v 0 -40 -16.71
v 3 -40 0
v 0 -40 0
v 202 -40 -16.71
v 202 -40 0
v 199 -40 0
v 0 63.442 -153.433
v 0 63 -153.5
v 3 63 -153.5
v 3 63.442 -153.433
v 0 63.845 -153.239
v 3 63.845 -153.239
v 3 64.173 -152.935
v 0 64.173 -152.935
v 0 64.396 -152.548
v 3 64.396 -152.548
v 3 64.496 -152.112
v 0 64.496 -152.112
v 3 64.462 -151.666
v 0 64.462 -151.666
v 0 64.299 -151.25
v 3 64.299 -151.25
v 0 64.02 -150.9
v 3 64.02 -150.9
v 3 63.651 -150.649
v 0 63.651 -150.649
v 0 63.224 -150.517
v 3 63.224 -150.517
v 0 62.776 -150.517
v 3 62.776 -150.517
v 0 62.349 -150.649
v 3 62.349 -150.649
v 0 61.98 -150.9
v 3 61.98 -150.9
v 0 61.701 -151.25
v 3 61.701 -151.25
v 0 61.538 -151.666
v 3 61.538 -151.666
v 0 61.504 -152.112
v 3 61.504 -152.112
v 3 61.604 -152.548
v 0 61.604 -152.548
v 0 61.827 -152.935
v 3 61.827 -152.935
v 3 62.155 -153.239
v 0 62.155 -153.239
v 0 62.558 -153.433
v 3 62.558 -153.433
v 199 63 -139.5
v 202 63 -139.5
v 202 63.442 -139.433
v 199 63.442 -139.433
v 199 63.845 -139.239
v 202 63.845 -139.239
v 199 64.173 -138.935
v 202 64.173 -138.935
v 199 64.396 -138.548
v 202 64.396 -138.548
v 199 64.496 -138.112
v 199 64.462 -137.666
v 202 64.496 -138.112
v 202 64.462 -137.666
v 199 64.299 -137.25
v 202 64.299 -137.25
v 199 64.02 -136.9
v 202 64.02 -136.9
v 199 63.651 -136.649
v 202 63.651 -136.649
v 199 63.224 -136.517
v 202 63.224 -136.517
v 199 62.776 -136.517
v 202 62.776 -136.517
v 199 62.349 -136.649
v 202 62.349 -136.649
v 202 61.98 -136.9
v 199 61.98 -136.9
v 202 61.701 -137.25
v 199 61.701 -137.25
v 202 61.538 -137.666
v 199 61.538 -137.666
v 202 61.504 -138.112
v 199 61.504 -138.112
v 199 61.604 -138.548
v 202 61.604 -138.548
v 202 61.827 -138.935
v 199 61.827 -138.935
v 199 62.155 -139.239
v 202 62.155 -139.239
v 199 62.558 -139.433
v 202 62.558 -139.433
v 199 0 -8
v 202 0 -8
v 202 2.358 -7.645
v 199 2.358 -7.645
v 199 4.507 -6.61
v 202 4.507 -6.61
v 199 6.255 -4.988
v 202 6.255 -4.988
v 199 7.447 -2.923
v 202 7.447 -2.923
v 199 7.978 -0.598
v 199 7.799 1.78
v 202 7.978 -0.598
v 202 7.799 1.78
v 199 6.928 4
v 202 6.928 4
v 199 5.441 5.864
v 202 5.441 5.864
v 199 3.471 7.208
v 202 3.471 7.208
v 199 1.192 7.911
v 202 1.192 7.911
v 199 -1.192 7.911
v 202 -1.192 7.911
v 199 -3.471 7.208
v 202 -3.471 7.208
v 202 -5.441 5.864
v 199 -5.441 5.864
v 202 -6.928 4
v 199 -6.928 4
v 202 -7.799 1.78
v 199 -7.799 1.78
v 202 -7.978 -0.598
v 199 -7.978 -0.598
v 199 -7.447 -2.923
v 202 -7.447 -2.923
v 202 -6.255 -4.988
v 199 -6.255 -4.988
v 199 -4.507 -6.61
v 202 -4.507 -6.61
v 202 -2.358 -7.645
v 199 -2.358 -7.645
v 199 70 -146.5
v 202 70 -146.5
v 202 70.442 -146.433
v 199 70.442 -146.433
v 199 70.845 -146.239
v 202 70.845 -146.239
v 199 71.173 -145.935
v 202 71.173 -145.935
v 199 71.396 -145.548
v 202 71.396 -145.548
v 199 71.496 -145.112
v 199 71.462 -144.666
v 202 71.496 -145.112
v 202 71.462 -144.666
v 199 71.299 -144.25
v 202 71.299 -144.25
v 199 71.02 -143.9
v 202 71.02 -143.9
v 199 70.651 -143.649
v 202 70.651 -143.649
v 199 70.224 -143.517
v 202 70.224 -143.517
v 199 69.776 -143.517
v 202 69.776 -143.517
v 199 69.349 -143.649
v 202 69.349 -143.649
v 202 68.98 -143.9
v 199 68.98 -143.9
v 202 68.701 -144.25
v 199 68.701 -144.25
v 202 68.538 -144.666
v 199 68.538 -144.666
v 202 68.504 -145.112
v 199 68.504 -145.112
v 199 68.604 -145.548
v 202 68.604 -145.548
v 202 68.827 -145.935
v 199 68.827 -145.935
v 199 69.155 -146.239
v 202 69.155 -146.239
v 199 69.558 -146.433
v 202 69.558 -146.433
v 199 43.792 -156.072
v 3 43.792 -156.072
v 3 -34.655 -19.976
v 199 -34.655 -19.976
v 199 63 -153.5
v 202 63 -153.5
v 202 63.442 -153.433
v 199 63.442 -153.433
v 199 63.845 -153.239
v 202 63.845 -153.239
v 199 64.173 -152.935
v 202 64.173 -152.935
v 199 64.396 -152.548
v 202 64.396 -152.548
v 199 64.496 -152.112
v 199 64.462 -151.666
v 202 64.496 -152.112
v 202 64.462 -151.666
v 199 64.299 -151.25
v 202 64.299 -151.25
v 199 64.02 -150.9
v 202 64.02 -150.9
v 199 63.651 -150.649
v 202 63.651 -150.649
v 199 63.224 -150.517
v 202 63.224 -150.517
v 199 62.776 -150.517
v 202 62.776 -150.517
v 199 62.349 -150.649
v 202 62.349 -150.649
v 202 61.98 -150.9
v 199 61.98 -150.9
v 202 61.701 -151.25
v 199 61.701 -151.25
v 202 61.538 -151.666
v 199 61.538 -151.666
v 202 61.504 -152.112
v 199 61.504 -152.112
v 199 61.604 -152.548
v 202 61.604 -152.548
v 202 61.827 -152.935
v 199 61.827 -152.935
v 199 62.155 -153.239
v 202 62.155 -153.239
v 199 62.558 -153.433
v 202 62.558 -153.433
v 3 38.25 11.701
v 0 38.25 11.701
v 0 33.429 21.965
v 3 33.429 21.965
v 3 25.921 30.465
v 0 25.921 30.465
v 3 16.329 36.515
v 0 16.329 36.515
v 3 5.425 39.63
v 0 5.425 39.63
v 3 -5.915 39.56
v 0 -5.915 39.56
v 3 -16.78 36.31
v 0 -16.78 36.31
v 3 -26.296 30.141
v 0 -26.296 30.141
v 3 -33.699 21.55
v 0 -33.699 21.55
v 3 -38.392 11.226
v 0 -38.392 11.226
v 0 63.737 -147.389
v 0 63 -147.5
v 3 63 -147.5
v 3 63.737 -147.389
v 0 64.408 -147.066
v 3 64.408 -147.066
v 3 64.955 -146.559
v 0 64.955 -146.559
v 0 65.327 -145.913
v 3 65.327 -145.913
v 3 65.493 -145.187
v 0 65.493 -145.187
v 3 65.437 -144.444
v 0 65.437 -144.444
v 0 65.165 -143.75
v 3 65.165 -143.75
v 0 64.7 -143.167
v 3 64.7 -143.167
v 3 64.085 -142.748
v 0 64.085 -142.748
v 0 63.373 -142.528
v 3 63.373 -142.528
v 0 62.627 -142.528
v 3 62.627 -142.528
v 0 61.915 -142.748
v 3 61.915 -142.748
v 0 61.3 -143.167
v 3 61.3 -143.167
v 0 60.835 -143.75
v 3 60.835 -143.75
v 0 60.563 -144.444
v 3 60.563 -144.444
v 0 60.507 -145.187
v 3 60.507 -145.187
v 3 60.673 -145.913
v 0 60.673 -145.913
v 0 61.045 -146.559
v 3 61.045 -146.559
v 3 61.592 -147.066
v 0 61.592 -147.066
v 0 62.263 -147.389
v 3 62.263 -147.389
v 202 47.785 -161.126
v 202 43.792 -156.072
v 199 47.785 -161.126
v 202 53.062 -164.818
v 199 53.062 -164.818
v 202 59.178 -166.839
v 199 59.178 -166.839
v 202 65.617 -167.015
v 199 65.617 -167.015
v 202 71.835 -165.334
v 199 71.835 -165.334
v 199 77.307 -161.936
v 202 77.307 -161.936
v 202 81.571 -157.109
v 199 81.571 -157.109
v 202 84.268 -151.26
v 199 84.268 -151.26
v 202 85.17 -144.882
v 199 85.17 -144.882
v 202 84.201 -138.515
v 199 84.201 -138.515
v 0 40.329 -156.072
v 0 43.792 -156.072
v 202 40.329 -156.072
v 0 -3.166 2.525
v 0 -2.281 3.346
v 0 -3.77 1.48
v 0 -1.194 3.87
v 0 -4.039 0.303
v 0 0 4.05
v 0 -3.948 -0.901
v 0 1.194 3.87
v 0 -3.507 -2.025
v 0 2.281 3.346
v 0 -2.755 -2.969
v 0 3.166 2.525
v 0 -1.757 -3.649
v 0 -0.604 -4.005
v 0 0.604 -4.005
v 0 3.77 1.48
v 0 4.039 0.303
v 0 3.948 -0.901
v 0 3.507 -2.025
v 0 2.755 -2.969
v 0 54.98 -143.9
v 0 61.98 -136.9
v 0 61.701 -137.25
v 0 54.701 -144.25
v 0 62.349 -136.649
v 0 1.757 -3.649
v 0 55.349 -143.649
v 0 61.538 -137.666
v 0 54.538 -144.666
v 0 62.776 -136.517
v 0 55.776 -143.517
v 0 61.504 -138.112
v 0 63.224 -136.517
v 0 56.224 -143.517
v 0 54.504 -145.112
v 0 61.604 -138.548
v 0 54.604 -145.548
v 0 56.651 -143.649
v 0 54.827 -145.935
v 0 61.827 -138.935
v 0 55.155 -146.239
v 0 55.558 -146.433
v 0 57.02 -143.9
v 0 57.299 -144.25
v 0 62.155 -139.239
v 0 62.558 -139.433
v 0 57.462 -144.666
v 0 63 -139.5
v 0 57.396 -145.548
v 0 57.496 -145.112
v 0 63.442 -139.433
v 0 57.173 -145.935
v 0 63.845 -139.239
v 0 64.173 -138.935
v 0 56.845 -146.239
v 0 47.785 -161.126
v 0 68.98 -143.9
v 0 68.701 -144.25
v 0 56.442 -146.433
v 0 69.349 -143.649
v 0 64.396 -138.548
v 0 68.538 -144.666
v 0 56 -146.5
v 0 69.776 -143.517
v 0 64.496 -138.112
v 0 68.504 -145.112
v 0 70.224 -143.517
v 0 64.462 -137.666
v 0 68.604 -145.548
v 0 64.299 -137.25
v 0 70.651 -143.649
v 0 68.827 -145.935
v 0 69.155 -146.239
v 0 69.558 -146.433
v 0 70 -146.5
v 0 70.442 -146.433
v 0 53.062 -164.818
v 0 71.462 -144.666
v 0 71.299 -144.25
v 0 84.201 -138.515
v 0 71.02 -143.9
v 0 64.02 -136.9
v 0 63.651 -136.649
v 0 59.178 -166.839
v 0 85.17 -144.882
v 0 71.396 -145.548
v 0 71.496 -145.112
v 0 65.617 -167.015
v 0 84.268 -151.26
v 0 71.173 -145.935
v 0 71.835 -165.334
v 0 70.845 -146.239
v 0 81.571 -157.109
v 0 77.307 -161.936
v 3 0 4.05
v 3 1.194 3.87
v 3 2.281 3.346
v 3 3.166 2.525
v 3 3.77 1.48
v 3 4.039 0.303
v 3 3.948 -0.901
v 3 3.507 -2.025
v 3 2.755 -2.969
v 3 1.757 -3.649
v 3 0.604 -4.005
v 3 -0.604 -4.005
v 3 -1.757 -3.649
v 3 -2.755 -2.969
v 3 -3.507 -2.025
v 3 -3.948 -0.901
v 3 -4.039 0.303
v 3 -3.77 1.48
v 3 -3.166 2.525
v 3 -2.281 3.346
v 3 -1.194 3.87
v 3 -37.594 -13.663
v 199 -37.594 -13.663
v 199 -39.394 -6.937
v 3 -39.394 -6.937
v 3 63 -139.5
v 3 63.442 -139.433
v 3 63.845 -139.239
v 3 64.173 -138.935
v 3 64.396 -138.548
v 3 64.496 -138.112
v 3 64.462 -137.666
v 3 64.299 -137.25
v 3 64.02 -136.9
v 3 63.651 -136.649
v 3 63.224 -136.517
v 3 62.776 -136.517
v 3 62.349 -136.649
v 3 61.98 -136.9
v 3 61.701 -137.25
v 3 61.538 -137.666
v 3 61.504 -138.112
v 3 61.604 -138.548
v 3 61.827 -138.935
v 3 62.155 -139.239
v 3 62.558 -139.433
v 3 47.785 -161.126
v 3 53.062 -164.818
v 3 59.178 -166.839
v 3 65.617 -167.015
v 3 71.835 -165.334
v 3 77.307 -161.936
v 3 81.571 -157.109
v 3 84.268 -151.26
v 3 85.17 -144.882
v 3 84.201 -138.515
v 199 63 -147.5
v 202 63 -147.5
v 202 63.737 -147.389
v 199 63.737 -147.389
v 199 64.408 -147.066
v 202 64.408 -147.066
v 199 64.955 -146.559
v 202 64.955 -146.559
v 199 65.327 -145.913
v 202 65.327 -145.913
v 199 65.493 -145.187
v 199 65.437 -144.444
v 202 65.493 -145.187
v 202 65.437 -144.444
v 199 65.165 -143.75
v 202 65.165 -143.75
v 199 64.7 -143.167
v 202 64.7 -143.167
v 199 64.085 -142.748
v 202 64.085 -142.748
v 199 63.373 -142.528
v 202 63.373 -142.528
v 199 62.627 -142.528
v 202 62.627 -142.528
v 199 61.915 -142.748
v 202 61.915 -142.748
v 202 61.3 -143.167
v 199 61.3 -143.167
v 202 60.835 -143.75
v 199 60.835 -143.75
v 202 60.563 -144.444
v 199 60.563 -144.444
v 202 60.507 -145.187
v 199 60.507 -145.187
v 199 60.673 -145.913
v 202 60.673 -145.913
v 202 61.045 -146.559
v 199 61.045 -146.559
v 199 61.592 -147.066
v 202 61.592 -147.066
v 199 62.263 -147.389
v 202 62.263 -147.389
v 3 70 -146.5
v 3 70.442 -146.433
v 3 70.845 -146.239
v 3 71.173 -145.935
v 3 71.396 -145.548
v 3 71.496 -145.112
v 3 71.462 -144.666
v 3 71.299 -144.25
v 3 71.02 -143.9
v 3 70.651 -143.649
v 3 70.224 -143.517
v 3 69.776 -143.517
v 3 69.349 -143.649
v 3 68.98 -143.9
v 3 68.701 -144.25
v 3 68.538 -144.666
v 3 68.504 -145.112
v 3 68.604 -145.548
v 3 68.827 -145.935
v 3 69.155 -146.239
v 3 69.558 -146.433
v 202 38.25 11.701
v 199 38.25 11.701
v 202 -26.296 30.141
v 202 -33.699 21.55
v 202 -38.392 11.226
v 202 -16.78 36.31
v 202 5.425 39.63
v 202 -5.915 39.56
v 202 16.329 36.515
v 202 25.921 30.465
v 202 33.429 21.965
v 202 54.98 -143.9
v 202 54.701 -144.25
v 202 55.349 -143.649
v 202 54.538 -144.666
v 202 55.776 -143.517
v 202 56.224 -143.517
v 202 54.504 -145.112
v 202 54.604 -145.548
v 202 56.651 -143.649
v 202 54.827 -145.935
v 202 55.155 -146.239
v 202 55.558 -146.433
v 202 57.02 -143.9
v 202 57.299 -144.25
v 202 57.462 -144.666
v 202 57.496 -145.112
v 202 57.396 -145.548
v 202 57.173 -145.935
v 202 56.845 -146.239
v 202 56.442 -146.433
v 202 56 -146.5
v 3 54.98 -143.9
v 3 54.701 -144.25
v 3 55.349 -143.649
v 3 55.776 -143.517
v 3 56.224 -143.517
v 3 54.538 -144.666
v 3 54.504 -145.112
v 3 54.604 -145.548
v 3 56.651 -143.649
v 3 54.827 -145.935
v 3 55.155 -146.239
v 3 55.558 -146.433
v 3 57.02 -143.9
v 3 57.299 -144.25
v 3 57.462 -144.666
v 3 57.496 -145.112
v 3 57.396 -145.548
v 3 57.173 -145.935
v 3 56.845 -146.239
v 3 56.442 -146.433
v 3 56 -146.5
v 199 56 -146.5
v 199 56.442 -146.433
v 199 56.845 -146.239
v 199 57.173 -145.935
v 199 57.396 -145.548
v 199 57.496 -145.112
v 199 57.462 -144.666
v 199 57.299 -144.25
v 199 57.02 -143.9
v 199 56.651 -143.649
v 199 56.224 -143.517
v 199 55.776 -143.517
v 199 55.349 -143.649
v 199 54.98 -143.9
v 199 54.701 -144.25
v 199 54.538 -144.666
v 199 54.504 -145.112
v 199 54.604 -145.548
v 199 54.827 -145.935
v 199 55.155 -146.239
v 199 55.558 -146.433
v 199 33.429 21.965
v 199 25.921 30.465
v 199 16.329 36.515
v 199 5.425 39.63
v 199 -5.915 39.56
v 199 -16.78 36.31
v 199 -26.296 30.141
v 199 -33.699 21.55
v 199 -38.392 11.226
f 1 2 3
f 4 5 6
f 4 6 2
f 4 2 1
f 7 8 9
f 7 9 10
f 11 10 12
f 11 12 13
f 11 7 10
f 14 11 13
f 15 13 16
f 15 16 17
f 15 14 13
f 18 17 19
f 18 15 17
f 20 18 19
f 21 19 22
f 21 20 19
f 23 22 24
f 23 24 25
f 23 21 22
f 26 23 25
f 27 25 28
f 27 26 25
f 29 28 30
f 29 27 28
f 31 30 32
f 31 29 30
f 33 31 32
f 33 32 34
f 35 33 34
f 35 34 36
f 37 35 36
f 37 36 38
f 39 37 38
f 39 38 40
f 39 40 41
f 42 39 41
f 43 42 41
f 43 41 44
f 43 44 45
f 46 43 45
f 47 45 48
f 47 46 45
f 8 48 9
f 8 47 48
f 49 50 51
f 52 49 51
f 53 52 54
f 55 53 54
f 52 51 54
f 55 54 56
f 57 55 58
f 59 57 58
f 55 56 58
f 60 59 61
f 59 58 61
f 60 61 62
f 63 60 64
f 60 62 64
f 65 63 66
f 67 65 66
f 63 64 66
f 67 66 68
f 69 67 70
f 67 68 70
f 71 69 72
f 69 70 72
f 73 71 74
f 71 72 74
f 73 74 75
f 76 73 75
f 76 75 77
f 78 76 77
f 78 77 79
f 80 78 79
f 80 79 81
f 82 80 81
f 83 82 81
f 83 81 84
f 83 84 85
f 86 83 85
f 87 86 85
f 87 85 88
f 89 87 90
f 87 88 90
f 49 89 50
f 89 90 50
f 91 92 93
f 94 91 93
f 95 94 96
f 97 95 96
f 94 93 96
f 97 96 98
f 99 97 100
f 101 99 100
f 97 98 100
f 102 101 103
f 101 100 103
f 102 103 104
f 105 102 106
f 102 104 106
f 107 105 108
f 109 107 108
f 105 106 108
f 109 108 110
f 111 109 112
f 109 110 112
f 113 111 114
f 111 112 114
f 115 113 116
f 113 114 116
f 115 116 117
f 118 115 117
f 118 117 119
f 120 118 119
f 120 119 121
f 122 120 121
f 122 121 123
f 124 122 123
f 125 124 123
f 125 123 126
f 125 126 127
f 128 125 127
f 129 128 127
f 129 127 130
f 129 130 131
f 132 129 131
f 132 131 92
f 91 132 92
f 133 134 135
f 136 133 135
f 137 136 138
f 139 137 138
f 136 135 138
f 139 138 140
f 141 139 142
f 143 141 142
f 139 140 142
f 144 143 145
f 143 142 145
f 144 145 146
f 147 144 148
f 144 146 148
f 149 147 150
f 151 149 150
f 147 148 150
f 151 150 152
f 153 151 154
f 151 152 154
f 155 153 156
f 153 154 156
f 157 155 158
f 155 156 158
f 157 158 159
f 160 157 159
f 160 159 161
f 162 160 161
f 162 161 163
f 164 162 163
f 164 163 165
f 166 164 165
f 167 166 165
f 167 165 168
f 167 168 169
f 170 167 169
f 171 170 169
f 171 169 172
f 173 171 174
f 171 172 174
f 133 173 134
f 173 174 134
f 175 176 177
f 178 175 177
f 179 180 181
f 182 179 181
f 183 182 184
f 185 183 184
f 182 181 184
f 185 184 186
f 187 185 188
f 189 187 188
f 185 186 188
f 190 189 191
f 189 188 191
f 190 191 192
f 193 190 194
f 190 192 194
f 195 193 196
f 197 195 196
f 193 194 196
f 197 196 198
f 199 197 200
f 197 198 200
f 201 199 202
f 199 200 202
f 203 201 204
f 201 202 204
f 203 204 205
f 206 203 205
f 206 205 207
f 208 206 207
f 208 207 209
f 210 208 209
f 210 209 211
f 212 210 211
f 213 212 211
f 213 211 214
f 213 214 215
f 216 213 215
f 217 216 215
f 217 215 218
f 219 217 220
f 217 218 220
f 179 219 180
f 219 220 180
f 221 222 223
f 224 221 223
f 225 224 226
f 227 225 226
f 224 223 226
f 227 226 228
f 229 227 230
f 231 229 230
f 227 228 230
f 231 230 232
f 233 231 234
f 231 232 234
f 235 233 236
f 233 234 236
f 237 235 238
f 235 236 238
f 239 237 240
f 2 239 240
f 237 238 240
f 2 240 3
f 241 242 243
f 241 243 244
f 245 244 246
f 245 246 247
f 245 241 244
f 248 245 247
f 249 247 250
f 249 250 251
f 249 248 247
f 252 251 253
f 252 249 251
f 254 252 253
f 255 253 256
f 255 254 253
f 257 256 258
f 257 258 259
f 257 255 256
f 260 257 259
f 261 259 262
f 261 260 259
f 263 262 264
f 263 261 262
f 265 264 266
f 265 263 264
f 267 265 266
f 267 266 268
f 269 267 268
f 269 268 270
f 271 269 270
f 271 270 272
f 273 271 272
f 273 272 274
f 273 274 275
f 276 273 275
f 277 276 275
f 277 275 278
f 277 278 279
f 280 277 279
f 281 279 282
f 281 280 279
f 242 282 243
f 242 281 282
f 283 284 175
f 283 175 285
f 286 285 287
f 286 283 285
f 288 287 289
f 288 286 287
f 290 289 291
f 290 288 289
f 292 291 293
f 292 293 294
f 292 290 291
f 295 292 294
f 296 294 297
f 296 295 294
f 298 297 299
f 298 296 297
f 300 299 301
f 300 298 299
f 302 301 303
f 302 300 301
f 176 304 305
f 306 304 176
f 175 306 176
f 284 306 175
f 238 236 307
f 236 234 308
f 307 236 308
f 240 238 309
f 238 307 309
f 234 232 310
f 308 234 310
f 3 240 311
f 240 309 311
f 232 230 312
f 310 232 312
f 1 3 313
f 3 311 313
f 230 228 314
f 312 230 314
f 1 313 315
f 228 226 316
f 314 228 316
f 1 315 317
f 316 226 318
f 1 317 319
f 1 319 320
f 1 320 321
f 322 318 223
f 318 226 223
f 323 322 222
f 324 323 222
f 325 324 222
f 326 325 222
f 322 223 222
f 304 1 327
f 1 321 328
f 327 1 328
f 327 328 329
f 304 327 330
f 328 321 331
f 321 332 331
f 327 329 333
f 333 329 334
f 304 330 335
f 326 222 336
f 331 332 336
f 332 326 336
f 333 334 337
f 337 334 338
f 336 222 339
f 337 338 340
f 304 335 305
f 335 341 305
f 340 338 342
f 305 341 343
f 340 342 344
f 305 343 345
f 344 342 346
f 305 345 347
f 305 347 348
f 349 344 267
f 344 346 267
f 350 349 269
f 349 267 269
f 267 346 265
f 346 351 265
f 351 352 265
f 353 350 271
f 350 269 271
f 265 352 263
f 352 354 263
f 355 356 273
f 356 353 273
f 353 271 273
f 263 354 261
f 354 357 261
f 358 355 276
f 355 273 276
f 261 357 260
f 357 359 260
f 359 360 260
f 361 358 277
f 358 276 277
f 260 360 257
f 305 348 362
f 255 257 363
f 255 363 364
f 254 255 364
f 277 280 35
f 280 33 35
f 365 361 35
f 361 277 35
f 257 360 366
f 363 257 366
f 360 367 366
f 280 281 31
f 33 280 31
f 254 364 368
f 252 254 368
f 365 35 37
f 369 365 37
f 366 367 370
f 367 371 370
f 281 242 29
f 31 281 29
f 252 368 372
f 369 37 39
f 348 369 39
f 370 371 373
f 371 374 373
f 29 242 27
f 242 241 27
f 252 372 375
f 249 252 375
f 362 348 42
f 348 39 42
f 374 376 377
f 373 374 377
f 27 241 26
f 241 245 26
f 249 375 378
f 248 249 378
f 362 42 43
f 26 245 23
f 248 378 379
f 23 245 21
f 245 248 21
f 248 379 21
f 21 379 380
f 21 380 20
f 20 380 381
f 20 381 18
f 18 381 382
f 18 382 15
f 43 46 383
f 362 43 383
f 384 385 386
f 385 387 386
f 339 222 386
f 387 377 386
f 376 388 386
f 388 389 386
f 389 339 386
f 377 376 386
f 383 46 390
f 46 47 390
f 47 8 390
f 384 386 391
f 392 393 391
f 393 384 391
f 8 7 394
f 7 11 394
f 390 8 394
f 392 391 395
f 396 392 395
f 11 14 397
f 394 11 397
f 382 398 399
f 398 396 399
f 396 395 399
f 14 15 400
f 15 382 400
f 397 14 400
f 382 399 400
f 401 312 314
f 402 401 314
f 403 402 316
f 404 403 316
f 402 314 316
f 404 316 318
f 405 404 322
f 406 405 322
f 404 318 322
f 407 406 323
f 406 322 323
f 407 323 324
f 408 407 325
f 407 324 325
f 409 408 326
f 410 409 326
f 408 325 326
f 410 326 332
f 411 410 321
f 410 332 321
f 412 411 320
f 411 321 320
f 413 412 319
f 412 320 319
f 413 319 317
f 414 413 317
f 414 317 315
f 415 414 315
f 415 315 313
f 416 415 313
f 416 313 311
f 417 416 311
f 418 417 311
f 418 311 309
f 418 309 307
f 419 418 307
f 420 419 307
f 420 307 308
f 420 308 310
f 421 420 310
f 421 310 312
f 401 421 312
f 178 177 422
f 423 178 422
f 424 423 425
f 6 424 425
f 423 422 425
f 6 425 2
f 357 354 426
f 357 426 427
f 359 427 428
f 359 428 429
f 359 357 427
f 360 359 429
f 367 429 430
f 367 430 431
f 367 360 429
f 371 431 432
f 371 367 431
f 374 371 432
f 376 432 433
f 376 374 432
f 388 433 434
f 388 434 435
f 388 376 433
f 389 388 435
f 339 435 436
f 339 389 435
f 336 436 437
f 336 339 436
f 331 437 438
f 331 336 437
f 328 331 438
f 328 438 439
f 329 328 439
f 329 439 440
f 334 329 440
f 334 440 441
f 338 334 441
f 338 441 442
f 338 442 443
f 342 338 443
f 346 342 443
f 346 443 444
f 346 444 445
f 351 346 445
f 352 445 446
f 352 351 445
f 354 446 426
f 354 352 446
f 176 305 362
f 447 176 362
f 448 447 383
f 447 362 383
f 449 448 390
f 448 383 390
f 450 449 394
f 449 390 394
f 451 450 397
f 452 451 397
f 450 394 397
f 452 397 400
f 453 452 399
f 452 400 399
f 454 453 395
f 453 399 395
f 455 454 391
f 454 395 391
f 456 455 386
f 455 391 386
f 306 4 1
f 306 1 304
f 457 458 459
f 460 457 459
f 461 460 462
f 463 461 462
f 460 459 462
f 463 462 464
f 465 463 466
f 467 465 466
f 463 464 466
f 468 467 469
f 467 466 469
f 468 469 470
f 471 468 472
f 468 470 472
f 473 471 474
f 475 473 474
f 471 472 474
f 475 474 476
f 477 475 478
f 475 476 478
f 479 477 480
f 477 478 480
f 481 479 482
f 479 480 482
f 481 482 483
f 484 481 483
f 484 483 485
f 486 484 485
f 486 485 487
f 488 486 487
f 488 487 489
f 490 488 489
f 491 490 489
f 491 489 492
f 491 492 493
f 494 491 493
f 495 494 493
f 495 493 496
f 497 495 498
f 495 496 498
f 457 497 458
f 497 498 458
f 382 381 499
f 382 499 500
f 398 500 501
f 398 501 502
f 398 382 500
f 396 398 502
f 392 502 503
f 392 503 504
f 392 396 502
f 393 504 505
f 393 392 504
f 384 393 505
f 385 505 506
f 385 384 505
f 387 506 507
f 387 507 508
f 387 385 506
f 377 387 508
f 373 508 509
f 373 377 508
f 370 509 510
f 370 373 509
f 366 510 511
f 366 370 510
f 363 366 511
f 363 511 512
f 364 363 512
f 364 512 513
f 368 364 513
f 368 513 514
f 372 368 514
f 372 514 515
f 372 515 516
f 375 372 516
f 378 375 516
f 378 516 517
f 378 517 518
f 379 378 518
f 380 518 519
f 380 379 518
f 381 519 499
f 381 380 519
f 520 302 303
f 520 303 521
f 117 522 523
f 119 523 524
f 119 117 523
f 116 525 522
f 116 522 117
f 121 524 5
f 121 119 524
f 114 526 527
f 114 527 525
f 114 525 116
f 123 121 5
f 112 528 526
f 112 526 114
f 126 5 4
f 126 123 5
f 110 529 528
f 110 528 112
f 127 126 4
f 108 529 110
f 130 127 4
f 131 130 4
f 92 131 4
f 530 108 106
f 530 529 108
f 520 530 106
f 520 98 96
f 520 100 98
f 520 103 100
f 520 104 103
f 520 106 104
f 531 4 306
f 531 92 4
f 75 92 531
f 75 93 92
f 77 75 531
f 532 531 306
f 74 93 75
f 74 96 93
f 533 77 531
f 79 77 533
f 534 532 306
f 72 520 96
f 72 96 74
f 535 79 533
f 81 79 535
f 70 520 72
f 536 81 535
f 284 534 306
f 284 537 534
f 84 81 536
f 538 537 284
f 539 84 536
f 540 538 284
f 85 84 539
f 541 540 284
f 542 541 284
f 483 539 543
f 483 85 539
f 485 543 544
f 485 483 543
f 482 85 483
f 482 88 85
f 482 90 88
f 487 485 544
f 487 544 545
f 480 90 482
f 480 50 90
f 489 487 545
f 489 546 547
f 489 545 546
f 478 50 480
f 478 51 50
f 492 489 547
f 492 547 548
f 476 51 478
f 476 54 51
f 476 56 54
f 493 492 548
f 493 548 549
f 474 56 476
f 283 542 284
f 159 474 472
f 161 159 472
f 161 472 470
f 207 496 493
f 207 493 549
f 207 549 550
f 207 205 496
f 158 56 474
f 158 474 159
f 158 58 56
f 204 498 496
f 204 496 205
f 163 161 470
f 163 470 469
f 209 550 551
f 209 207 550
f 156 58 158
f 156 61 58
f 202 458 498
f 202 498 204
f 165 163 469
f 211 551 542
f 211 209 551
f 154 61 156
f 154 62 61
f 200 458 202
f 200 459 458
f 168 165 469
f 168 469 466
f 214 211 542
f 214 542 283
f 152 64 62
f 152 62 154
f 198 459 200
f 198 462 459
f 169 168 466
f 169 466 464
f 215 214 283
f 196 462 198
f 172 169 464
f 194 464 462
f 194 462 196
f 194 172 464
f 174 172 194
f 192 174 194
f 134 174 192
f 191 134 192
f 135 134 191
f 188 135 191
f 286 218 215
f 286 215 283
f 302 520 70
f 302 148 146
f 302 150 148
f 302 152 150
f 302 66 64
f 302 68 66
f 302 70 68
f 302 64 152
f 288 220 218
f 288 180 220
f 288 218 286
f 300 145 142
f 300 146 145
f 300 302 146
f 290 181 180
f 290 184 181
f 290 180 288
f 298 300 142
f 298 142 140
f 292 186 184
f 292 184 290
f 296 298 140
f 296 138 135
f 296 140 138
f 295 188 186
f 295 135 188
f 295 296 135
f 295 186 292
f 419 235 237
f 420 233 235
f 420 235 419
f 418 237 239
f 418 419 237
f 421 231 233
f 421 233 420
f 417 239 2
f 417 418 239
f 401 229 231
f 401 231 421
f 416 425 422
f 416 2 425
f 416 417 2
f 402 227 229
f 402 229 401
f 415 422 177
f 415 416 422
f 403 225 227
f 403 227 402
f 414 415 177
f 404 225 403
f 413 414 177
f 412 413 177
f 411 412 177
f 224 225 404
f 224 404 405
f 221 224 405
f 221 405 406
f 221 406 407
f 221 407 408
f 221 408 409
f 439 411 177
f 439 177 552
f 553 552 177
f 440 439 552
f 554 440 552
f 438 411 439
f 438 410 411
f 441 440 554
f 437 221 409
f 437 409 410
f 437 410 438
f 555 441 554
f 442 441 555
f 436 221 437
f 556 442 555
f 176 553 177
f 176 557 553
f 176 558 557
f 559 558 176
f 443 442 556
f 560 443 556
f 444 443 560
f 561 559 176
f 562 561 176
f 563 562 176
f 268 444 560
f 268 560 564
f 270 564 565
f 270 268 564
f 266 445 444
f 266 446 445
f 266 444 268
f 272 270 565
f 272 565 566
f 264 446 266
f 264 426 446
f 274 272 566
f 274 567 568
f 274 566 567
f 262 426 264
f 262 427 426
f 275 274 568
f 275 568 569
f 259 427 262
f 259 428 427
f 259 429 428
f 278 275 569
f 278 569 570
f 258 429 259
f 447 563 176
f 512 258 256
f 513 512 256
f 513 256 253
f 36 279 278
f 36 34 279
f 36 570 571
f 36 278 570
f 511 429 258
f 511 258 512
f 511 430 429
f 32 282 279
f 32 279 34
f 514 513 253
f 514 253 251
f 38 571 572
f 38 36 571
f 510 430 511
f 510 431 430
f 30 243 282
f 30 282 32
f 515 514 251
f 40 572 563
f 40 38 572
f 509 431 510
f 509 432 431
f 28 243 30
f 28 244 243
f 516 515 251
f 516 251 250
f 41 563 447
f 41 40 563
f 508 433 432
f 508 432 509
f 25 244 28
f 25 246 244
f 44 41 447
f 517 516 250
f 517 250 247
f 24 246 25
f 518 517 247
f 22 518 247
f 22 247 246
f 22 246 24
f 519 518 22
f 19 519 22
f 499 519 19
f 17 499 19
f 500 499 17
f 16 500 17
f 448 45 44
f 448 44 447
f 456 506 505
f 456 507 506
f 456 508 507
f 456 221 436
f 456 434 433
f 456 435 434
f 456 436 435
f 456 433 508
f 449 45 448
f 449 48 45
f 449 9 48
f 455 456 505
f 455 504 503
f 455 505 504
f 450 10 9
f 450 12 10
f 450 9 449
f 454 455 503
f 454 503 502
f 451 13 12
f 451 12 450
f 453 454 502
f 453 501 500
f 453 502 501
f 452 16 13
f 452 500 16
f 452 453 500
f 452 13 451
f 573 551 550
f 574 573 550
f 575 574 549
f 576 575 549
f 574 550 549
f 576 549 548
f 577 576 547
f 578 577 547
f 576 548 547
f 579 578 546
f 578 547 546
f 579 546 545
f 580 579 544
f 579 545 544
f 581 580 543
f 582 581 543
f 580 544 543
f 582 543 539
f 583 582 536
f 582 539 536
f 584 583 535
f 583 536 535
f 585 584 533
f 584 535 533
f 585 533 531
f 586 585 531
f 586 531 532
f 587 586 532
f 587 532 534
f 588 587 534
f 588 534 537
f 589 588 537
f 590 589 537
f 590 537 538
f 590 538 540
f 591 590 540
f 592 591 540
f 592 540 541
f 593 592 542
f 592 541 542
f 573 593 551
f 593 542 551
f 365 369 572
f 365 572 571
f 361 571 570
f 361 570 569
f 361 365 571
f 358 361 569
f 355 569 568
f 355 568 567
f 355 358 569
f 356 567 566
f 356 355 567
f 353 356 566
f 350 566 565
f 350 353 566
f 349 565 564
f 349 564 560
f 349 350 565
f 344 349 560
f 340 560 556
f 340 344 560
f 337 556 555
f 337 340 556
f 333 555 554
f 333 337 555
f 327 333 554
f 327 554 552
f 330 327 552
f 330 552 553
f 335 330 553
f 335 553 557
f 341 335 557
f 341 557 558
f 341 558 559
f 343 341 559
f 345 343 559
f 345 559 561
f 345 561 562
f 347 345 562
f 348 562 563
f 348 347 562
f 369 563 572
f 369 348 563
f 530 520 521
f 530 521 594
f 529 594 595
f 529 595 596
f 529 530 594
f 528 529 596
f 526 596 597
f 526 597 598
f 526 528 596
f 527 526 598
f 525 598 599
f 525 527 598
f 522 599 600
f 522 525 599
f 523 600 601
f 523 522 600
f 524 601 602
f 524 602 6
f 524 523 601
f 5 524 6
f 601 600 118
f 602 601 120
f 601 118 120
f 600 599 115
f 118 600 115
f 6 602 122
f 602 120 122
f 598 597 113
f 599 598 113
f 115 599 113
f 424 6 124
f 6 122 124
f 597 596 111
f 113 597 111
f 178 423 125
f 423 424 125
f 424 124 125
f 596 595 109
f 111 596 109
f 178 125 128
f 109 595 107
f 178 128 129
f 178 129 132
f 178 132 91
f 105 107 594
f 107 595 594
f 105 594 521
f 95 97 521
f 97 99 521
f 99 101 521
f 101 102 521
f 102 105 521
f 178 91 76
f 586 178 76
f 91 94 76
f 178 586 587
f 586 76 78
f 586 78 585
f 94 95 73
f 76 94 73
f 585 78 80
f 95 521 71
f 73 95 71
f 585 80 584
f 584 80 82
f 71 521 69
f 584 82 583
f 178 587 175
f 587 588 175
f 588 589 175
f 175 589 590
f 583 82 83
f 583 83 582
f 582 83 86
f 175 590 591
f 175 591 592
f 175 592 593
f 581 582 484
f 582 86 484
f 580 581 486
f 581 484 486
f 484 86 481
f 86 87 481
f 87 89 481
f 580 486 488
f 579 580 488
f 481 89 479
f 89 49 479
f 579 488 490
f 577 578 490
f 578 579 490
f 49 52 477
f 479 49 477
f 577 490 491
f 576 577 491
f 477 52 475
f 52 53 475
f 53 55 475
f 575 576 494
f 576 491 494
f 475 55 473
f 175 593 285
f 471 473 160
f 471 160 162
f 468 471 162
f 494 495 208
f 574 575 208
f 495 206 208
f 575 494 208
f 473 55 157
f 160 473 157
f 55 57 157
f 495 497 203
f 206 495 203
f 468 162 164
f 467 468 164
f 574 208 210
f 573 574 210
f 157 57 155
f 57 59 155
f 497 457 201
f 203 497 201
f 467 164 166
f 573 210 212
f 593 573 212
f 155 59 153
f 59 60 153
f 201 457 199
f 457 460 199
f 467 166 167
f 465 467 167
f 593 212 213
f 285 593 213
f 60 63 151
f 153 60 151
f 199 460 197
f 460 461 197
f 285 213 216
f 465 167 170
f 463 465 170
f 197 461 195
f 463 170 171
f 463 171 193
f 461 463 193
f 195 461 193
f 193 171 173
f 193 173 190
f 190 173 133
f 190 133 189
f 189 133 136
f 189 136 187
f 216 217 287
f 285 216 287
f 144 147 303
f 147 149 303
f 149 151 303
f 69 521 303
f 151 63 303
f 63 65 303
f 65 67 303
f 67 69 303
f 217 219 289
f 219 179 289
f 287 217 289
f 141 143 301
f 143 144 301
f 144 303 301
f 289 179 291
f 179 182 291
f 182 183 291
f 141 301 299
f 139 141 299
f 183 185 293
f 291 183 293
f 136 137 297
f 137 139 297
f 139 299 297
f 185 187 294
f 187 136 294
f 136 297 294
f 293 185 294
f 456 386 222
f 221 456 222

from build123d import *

# Parameters (mm, degrees)
SKETCH_2_R          = 3
SKETCH_2_R_2        = 1.5
SKETCH_2_R_3        = 2.5
EXTRUDE_1_DEPTH     = 3
EXTRUDE_2_DEPTH     = 196
SKETCH_5_R          = 8
CUT_EXTRUDE_1_DEPTH = 10
SKETCH_6_R          = 4.05
CUT_EXTRUDE_2_DEPTH = 10


with BuildPart() as part:
    # 草图2 → 凸台-拉伸1 (new body)
    with BuildSketch(Plane(origin=(0, 0, 0), x_dir=(0, 0, -1), z_dir=(1, 0, 0))):
        with BuildLine():
            Line((138.514809283, 84.200667909), (-11.70063651, 38.25042621))
            ThreePointArc((-11.70063651, 38.25042621), (-39.560188627, -5.915359313), (0, -40))
            Line((0, -40), (16.710190716, -40))
            Line((16.710190716, -40), (156.071648789, 40.329376559))
            Line((156.071648789, 40.329376559), (156.071648789, 43.792069046))
            ThreePointArc((156.071648789, 43.792069046), (165.334026038, 71.834783727), (138.514809283, 84.200667909))
        make_face()
        Circle(SKETCH_2_R, mode=Mode.SUBTRACT)
        with Locations((145, 70)):
            Circle(SKETCH_2_R_2, mode=Mode.SUBTRACT)
        with Locations((138, 63)):
            Circle(SKETCH_2_R_2, mode=Mode.SUBTRACT)
        with Locations((145, 56)):
            Circle(SKETCH_2_R_2, mode=Mode.SUBTRACT)
        with Locations((145, 63)):
            Circle(SKETCH_2_R_3, mode=Mode.SUBTRACT)
        with Locations((152, 63)):
            Circle(SKETCH_2_R_2, mode=Mode.SUBTRACT)
    extrude_1 = extrude(amount=EXTRUDE_1_DEPTH)

    # 草图4 → 凸台-拉伸2 (add)
    with BuildSketch(Plane(origin=(3, 0, 0), x_dir=(0, 0, -1), z_dir=(1, 0, 0))):
        with BuildLine():
            Line((0, -40), (16.710190716, -40))
            Line((16.710190716, -40), (156.071648789, 40.329376559))
            Line((156.071648789, 40.329376559), (156.071648789, 43.792069046))
            Line((156.071648789, 43.792069046), (19.975563357, -34.655113166))
            ThreePointArc((19.975563357, -34.655113166), (10.339136167, -38.640681455), (0, -40))
        make_face()
    extrude(amount=EXTRUDE_2_DEPTH)

    # 镜向2: 凸台-拉伸1 across plane
    add(extrude_1.mirror(Plane(origin=(101, 0, 0), x_dir=(0, 0, 1), z_dir=(1, 0, 0))))

    # 草图5 → 切除-拉伸1 (cut)
    with BuildSketch(Plane(origin=(202, 0, 0), x_dir=(0, 0, -1), z_dir=(1, 0, 0))):
        Circle(SKETCH_5_R)
    extrude(amount=-CUT_EXTRUDE_1_DEPTH, mode=Mode.SUBTRACT)

    # 草图6 → 切除-拉伸2 (cut)
    with BuildSketch(Plane.ZY):
        Circle(SKETCH_6_R)
    extrude(amount=-CUT_EXTRUDE_2_DEPTH, mode=Mode.SUBTRACT)


solid = part.part
